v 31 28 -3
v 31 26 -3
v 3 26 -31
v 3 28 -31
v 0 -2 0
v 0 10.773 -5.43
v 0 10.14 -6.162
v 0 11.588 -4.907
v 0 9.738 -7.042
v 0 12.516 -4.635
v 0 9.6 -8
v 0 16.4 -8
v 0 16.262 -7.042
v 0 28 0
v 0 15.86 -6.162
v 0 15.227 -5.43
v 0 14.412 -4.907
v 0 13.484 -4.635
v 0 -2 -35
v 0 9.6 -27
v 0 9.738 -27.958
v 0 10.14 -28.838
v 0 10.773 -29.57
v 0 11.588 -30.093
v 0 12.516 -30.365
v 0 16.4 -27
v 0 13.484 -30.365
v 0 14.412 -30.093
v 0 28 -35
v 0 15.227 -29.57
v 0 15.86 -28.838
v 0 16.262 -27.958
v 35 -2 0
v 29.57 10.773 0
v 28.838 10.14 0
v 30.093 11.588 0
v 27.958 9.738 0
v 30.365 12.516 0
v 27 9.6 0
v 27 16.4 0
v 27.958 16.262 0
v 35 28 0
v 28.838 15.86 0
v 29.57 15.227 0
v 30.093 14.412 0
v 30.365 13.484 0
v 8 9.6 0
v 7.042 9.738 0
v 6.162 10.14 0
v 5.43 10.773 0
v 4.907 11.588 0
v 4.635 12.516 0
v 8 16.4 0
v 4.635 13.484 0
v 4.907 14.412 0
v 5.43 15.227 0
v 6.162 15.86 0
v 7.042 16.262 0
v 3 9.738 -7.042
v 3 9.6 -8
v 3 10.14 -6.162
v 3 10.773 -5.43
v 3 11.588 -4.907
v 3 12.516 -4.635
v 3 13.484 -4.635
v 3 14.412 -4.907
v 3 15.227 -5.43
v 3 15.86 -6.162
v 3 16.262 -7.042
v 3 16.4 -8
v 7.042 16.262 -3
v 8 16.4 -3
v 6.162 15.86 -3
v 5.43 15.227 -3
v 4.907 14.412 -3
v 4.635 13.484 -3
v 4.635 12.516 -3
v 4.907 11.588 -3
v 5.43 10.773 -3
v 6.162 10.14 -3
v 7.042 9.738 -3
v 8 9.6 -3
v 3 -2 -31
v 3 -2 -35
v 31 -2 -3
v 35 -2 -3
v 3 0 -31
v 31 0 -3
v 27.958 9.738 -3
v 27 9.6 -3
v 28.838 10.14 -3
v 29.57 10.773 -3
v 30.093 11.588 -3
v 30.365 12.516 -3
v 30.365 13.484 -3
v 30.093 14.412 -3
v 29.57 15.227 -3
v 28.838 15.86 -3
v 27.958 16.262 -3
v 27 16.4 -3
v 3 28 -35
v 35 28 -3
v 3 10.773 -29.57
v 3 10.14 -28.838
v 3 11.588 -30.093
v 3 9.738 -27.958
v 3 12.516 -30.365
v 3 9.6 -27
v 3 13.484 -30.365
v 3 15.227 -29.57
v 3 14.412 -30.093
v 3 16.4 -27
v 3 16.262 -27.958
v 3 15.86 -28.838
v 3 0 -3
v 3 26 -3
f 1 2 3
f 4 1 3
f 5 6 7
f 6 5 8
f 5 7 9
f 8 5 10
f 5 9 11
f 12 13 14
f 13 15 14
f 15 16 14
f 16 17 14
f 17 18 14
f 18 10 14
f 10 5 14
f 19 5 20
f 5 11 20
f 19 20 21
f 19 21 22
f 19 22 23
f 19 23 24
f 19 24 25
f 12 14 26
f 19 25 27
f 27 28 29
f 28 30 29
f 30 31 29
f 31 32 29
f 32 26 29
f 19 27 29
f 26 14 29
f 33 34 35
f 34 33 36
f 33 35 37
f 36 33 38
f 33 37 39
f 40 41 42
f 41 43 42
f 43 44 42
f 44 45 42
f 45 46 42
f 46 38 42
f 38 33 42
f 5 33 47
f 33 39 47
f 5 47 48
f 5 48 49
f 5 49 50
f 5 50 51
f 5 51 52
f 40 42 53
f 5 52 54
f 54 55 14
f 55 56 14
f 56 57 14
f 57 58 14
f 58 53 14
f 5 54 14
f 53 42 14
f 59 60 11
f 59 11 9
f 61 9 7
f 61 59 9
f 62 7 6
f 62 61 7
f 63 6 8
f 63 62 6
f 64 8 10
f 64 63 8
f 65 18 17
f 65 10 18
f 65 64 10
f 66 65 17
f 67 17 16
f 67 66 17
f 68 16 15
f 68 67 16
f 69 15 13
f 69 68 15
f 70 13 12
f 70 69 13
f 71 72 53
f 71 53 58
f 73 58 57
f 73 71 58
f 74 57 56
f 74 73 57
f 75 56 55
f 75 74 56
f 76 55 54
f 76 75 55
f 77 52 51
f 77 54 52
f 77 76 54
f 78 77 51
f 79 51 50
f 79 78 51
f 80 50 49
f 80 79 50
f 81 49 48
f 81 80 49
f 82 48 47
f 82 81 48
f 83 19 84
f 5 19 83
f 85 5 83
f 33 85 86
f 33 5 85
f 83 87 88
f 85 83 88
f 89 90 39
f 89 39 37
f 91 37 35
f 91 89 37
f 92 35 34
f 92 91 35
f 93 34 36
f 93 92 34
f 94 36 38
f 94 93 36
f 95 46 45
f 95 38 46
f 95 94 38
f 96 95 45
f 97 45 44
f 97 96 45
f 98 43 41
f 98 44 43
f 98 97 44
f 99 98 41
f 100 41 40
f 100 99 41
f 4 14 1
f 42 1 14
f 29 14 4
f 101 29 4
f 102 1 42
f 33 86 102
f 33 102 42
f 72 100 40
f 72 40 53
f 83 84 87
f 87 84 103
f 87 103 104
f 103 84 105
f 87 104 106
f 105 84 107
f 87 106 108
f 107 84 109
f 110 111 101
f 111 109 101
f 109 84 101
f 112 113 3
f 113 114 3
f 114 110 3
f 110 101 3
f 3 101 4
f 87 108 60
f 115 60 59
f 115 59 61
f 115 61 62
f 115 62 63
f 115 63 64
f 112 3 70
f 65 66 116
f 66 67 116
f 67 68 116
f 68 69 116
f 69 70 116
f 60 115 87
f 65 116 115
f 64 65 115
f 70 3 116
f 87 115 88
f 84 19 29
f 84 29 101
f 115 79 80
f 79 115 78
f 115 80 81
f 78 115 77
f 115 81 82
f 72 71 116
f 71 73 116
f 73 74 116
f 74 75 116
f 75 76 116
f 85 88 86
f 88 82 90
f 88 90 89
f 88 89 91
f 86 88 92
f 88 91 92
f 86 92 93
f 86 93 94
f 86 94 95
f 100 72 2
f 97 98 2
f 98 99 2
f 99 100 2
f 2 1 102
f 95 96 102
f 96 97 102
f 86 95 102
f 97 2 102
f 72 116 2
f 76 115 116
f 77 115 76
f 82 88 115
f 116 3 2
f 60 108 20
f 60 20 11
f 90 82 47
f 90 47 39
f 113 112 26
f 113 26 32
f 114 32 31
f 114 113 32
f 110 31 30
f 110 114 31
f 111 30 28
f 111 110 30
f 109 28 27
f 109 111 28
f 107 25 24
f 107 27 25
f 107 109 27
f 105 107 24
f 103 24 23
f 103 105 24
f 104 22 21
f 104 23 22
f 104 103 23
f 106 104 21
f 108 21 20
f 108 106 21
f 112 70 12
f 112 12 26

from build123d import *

# Parameters (mm, degrees)
BOSS_EXTRUDE1_DEPTH = 26
BOSS_EXTRUDE2_DEPTH = 2
BOSS_EXTRUDE3_DEPTH = 2
CUT_EXTRUDE1_DEPTH  = 4
CUT_EXTRUDE2_DEPTH  = 4


with BuildPart() as part:
    # Sketch1 → Boss-Extrude1 (new body)
    with BuildSketch(Plane(origin=(0, 0, 0), x_dir=(1, 0, 0), z_dir=(0, 1, 0))):
        Polygon((0, 0), (0, 35), (3, 35), (3, 3), (35, 3), (35, 0), align=None)
    extrude(amount=BOSS_EXTRUDE1_DEPTH)

    # Sketch2 → Boss-Extrude2 (add)
    with BuildSketch(Plane(origin=(0, 26, 0), x_dir=(1, 0, 0), z_dir=(0, 1, 0))):
        Polygon((3, 35), (0, 35), (0, 0), (35, 0), (35, 3), (31, 3), (3, 31), align=None)
    extrude(amount=BOSS_EXTRUDE2_DEPTH)

    # Sketch3 → Boss-Extrude3 (add)
    with BuildSketch(Plane.XZ):
        Polygon((0, 0), (0, -35), (3, -35), (3, -31), (31, -3), (35, -3), (35, 0), align=None)
    extrude(amount=BOSS_EXTRUDE3_DEPTH)

    # Sketch4 → Cut-Extrude1 (cut, through all)
    with BuildSketch(Plane(origin=(0, 0, -3), x_dir=(-1, 0, 0), z_dir=(0, 0, -1))):
        with BuildLine():
            Line((-27, 16.4), (-8, 16.4))
            ThreePointArc((-8, 16.4), (-4.6, 13), (-8, 9.6))
            Line((-8, 9.6), (-27, 9.6))
            ThreePointArc((-27, 9.6), (-30.4, 13), (-27, 16.4))
        make_face()
    extrude(amount=-CUT_EXTRUDE1_DEPTH, mode=Mode.SUBTRACT)

    # Sketch5 → Cut-Extrude2 (cut, through all)
    with BuildSketch(Plane(origin=(3, 0, 0), x_dir=(0, 0, -1), z_dir=(1, 0, 0))):
        with BuildLine():
            Line((8, 16.4), (27, 16.4))
            ThreePointArc((27, 16.4), (30.4, 13), (27, 9.6))
            Line((27, 9.6), (8, 9.6))
            ThreePointArc((8, 9.6), (4.6, 13), (8, 16.4))
        make_face()
    extrude(amount=-CUT_EXTRUDE2_DEPTH, mode=Mode.SUBTRACT)


solid = part.part
